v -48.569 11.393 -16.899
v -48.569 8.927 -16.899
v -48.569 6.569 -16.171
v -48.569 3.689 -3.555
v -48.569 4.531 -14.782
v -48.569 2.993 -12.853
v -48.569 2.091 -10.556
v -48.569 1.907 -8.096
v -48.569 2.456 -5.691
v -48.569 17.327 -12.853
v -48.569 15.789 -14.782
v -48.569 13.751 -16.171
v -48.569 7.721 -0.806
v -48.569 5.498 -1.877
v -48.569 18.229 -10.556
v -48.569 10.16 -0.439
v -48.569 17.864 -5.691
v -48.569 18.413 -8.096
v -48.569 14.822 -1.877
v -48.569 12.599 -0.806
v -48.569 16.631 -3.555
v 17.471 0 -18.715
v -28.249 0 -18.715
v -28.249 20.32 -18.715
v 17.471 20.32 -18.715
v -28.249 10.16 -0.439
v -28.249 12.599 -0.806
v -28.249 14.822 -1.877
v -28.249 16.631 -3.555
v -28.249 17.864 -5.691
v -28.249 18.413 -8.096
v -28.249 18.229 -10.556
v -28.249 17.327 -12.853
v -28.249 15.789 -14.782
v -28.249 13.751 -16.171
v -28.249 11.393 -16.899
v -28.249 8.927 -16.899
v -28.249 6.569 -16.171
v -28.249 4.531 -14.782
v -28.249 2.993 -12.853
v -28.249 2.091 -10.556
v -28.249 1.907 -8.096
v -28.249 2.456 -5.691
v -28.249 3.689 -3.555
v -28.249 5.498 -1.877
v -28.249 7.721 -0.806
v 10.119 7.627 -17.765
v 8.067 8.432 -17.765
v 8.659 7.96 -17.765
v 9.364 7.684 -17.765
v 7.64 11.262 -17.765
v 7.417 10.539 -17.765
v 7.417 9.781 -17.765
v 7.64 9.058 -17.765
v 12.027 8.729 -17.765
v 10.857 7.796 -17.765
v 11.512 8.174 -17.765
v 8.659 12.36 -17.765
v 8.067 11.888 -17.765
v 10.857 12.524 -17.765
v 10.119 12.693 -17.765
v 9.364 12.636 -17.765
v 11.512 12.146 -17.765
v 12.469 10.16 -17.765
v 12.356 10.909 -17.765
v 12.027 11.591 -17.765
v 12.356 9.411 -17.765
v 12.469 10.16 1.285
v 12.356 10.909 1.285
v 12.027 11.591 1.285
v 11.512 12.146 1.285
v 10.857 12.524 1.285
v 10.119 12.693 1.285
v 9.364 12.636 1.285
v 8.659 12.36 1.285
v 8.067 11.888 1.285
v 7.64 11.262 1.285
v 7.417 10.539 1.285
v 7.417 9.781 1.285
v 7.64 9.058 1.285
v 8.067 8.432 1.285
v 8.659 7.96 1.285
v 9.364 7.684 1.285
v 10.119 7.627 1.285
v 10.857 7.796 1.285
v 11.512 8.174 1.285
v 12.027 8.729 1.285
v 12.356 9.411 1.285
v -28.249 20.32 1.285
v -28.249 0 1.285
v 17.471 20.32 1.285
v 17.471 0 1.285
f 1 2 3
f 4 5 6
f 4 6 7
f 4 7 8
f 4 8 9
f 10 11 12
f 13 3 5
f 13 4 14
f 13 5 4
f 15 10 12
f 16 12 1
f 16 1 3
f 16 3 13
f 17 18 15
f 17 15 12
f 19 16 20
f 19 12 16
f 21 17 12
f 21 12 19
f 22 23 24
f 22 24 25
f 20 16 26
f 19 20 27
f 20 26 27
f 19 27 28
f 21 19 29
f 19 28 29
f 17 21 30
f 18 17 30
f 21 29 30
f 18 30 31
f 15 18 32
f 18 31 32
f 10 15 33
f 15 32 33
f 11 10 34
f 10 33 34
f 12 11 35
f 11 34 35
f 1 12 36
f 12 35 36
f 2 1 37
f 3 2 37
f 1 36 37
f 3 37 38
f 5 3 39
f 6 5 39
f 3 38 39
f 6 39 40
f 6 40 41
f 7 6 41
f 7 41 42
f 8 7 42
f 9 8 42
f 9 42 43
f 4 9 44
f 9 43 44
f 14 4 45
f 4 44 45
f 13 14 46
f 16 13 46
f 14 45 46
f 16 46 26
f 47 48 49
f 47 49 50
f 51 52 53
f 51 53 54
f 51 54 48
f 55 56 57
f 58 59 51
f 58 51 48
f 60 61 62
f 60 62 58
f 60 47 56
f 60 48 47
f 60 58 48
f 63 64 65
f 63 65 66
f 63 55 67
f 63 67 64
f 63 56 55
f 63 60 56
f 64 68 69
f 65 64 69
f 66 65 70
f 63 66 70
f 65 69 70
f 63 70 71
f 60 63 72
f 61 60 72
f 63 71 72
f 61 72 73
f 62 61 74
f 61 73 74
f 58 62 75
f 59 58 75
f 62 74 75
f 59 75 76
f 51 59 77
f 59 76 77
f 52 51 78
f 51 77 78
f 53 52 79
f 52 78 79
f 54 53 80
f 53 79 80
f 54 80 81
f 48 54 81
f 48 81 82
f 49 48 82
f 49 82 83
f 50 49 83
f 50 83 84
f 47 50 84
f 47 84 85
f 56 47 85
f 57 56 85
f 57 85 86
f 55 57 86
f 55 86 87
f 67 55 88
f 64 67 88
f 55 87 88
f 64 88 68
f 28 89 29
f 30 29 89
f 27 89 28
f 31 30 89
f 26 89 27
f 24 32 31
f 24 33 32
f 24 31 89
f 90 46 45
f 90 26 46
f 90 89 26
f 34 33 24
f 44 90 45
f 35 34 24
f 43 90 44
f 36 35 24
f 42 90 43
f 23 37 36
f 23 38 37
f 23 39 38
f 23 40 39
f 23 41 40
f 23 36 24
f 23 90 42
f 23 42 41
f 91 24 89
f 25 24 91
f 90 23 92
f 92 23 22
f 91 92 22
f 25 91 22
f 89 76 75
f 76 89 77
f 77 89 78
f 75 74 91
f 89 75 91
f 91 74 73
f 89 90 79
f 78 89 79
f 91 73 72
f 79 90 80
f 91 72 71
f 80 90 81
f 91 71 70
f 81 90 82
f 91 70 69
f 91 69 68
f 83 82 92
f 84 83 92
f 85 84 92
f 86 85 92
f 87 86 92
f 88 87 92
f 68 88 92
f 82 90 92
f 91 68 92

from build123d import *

# Parameters (mm, degrees)
SKETCH1_W           = 45.72
SKETCH1_H           = 20
BOSS_EXTRUDE1_DEPTH = 20.32
SKETCH2_R           = 8.276149927
BOSS_EXTRUDE2_DEPTH = 20.32
SKETCH4_R           = 2.54
CUT_EXTRUDE1_DEPTH  = 19.05


with BuildPart() as part:
    # Sketch1 → Boss-Extrude1 (new body)
    with BuildSketch(Plane(origin=(0, 0, 1.285201824), x_dir=(1, 0, 0), z_dir=(0, 1, 0))):
        with Locations((-5.388735632, 10)):
            Rectangle(SKETCH1_W, SKETCH1_H)
    extrude(amount=BOSS_EXTRUDE1_DEPTH)

    # Sketch2 → Boss-Extrude2 (add)
    with BuildSketch(Plane(origin=(-28.248735632, 0, 1.285201824), x_dir=(0, 0, 1), z_dir=(-1, 0, 0))):
        with Locations((-10, 10.16)):
            Circle(SKETCH2_R)
    extrude(amount=BOSS_EXTRUDE2_DEPTH)

    # Sketch4 → Cut-Extrude1 (cut)
    with BuildSketch(Plane.XY.offset(1.285201824)):
        with Locations((9.928717344, 10.16)):
            Circle(SKETCH4_R)
    extrude(amount=-CUT_EXTRUDE1_DEPTH, mode=Mode.SUBTRACT)


solid = part.part
